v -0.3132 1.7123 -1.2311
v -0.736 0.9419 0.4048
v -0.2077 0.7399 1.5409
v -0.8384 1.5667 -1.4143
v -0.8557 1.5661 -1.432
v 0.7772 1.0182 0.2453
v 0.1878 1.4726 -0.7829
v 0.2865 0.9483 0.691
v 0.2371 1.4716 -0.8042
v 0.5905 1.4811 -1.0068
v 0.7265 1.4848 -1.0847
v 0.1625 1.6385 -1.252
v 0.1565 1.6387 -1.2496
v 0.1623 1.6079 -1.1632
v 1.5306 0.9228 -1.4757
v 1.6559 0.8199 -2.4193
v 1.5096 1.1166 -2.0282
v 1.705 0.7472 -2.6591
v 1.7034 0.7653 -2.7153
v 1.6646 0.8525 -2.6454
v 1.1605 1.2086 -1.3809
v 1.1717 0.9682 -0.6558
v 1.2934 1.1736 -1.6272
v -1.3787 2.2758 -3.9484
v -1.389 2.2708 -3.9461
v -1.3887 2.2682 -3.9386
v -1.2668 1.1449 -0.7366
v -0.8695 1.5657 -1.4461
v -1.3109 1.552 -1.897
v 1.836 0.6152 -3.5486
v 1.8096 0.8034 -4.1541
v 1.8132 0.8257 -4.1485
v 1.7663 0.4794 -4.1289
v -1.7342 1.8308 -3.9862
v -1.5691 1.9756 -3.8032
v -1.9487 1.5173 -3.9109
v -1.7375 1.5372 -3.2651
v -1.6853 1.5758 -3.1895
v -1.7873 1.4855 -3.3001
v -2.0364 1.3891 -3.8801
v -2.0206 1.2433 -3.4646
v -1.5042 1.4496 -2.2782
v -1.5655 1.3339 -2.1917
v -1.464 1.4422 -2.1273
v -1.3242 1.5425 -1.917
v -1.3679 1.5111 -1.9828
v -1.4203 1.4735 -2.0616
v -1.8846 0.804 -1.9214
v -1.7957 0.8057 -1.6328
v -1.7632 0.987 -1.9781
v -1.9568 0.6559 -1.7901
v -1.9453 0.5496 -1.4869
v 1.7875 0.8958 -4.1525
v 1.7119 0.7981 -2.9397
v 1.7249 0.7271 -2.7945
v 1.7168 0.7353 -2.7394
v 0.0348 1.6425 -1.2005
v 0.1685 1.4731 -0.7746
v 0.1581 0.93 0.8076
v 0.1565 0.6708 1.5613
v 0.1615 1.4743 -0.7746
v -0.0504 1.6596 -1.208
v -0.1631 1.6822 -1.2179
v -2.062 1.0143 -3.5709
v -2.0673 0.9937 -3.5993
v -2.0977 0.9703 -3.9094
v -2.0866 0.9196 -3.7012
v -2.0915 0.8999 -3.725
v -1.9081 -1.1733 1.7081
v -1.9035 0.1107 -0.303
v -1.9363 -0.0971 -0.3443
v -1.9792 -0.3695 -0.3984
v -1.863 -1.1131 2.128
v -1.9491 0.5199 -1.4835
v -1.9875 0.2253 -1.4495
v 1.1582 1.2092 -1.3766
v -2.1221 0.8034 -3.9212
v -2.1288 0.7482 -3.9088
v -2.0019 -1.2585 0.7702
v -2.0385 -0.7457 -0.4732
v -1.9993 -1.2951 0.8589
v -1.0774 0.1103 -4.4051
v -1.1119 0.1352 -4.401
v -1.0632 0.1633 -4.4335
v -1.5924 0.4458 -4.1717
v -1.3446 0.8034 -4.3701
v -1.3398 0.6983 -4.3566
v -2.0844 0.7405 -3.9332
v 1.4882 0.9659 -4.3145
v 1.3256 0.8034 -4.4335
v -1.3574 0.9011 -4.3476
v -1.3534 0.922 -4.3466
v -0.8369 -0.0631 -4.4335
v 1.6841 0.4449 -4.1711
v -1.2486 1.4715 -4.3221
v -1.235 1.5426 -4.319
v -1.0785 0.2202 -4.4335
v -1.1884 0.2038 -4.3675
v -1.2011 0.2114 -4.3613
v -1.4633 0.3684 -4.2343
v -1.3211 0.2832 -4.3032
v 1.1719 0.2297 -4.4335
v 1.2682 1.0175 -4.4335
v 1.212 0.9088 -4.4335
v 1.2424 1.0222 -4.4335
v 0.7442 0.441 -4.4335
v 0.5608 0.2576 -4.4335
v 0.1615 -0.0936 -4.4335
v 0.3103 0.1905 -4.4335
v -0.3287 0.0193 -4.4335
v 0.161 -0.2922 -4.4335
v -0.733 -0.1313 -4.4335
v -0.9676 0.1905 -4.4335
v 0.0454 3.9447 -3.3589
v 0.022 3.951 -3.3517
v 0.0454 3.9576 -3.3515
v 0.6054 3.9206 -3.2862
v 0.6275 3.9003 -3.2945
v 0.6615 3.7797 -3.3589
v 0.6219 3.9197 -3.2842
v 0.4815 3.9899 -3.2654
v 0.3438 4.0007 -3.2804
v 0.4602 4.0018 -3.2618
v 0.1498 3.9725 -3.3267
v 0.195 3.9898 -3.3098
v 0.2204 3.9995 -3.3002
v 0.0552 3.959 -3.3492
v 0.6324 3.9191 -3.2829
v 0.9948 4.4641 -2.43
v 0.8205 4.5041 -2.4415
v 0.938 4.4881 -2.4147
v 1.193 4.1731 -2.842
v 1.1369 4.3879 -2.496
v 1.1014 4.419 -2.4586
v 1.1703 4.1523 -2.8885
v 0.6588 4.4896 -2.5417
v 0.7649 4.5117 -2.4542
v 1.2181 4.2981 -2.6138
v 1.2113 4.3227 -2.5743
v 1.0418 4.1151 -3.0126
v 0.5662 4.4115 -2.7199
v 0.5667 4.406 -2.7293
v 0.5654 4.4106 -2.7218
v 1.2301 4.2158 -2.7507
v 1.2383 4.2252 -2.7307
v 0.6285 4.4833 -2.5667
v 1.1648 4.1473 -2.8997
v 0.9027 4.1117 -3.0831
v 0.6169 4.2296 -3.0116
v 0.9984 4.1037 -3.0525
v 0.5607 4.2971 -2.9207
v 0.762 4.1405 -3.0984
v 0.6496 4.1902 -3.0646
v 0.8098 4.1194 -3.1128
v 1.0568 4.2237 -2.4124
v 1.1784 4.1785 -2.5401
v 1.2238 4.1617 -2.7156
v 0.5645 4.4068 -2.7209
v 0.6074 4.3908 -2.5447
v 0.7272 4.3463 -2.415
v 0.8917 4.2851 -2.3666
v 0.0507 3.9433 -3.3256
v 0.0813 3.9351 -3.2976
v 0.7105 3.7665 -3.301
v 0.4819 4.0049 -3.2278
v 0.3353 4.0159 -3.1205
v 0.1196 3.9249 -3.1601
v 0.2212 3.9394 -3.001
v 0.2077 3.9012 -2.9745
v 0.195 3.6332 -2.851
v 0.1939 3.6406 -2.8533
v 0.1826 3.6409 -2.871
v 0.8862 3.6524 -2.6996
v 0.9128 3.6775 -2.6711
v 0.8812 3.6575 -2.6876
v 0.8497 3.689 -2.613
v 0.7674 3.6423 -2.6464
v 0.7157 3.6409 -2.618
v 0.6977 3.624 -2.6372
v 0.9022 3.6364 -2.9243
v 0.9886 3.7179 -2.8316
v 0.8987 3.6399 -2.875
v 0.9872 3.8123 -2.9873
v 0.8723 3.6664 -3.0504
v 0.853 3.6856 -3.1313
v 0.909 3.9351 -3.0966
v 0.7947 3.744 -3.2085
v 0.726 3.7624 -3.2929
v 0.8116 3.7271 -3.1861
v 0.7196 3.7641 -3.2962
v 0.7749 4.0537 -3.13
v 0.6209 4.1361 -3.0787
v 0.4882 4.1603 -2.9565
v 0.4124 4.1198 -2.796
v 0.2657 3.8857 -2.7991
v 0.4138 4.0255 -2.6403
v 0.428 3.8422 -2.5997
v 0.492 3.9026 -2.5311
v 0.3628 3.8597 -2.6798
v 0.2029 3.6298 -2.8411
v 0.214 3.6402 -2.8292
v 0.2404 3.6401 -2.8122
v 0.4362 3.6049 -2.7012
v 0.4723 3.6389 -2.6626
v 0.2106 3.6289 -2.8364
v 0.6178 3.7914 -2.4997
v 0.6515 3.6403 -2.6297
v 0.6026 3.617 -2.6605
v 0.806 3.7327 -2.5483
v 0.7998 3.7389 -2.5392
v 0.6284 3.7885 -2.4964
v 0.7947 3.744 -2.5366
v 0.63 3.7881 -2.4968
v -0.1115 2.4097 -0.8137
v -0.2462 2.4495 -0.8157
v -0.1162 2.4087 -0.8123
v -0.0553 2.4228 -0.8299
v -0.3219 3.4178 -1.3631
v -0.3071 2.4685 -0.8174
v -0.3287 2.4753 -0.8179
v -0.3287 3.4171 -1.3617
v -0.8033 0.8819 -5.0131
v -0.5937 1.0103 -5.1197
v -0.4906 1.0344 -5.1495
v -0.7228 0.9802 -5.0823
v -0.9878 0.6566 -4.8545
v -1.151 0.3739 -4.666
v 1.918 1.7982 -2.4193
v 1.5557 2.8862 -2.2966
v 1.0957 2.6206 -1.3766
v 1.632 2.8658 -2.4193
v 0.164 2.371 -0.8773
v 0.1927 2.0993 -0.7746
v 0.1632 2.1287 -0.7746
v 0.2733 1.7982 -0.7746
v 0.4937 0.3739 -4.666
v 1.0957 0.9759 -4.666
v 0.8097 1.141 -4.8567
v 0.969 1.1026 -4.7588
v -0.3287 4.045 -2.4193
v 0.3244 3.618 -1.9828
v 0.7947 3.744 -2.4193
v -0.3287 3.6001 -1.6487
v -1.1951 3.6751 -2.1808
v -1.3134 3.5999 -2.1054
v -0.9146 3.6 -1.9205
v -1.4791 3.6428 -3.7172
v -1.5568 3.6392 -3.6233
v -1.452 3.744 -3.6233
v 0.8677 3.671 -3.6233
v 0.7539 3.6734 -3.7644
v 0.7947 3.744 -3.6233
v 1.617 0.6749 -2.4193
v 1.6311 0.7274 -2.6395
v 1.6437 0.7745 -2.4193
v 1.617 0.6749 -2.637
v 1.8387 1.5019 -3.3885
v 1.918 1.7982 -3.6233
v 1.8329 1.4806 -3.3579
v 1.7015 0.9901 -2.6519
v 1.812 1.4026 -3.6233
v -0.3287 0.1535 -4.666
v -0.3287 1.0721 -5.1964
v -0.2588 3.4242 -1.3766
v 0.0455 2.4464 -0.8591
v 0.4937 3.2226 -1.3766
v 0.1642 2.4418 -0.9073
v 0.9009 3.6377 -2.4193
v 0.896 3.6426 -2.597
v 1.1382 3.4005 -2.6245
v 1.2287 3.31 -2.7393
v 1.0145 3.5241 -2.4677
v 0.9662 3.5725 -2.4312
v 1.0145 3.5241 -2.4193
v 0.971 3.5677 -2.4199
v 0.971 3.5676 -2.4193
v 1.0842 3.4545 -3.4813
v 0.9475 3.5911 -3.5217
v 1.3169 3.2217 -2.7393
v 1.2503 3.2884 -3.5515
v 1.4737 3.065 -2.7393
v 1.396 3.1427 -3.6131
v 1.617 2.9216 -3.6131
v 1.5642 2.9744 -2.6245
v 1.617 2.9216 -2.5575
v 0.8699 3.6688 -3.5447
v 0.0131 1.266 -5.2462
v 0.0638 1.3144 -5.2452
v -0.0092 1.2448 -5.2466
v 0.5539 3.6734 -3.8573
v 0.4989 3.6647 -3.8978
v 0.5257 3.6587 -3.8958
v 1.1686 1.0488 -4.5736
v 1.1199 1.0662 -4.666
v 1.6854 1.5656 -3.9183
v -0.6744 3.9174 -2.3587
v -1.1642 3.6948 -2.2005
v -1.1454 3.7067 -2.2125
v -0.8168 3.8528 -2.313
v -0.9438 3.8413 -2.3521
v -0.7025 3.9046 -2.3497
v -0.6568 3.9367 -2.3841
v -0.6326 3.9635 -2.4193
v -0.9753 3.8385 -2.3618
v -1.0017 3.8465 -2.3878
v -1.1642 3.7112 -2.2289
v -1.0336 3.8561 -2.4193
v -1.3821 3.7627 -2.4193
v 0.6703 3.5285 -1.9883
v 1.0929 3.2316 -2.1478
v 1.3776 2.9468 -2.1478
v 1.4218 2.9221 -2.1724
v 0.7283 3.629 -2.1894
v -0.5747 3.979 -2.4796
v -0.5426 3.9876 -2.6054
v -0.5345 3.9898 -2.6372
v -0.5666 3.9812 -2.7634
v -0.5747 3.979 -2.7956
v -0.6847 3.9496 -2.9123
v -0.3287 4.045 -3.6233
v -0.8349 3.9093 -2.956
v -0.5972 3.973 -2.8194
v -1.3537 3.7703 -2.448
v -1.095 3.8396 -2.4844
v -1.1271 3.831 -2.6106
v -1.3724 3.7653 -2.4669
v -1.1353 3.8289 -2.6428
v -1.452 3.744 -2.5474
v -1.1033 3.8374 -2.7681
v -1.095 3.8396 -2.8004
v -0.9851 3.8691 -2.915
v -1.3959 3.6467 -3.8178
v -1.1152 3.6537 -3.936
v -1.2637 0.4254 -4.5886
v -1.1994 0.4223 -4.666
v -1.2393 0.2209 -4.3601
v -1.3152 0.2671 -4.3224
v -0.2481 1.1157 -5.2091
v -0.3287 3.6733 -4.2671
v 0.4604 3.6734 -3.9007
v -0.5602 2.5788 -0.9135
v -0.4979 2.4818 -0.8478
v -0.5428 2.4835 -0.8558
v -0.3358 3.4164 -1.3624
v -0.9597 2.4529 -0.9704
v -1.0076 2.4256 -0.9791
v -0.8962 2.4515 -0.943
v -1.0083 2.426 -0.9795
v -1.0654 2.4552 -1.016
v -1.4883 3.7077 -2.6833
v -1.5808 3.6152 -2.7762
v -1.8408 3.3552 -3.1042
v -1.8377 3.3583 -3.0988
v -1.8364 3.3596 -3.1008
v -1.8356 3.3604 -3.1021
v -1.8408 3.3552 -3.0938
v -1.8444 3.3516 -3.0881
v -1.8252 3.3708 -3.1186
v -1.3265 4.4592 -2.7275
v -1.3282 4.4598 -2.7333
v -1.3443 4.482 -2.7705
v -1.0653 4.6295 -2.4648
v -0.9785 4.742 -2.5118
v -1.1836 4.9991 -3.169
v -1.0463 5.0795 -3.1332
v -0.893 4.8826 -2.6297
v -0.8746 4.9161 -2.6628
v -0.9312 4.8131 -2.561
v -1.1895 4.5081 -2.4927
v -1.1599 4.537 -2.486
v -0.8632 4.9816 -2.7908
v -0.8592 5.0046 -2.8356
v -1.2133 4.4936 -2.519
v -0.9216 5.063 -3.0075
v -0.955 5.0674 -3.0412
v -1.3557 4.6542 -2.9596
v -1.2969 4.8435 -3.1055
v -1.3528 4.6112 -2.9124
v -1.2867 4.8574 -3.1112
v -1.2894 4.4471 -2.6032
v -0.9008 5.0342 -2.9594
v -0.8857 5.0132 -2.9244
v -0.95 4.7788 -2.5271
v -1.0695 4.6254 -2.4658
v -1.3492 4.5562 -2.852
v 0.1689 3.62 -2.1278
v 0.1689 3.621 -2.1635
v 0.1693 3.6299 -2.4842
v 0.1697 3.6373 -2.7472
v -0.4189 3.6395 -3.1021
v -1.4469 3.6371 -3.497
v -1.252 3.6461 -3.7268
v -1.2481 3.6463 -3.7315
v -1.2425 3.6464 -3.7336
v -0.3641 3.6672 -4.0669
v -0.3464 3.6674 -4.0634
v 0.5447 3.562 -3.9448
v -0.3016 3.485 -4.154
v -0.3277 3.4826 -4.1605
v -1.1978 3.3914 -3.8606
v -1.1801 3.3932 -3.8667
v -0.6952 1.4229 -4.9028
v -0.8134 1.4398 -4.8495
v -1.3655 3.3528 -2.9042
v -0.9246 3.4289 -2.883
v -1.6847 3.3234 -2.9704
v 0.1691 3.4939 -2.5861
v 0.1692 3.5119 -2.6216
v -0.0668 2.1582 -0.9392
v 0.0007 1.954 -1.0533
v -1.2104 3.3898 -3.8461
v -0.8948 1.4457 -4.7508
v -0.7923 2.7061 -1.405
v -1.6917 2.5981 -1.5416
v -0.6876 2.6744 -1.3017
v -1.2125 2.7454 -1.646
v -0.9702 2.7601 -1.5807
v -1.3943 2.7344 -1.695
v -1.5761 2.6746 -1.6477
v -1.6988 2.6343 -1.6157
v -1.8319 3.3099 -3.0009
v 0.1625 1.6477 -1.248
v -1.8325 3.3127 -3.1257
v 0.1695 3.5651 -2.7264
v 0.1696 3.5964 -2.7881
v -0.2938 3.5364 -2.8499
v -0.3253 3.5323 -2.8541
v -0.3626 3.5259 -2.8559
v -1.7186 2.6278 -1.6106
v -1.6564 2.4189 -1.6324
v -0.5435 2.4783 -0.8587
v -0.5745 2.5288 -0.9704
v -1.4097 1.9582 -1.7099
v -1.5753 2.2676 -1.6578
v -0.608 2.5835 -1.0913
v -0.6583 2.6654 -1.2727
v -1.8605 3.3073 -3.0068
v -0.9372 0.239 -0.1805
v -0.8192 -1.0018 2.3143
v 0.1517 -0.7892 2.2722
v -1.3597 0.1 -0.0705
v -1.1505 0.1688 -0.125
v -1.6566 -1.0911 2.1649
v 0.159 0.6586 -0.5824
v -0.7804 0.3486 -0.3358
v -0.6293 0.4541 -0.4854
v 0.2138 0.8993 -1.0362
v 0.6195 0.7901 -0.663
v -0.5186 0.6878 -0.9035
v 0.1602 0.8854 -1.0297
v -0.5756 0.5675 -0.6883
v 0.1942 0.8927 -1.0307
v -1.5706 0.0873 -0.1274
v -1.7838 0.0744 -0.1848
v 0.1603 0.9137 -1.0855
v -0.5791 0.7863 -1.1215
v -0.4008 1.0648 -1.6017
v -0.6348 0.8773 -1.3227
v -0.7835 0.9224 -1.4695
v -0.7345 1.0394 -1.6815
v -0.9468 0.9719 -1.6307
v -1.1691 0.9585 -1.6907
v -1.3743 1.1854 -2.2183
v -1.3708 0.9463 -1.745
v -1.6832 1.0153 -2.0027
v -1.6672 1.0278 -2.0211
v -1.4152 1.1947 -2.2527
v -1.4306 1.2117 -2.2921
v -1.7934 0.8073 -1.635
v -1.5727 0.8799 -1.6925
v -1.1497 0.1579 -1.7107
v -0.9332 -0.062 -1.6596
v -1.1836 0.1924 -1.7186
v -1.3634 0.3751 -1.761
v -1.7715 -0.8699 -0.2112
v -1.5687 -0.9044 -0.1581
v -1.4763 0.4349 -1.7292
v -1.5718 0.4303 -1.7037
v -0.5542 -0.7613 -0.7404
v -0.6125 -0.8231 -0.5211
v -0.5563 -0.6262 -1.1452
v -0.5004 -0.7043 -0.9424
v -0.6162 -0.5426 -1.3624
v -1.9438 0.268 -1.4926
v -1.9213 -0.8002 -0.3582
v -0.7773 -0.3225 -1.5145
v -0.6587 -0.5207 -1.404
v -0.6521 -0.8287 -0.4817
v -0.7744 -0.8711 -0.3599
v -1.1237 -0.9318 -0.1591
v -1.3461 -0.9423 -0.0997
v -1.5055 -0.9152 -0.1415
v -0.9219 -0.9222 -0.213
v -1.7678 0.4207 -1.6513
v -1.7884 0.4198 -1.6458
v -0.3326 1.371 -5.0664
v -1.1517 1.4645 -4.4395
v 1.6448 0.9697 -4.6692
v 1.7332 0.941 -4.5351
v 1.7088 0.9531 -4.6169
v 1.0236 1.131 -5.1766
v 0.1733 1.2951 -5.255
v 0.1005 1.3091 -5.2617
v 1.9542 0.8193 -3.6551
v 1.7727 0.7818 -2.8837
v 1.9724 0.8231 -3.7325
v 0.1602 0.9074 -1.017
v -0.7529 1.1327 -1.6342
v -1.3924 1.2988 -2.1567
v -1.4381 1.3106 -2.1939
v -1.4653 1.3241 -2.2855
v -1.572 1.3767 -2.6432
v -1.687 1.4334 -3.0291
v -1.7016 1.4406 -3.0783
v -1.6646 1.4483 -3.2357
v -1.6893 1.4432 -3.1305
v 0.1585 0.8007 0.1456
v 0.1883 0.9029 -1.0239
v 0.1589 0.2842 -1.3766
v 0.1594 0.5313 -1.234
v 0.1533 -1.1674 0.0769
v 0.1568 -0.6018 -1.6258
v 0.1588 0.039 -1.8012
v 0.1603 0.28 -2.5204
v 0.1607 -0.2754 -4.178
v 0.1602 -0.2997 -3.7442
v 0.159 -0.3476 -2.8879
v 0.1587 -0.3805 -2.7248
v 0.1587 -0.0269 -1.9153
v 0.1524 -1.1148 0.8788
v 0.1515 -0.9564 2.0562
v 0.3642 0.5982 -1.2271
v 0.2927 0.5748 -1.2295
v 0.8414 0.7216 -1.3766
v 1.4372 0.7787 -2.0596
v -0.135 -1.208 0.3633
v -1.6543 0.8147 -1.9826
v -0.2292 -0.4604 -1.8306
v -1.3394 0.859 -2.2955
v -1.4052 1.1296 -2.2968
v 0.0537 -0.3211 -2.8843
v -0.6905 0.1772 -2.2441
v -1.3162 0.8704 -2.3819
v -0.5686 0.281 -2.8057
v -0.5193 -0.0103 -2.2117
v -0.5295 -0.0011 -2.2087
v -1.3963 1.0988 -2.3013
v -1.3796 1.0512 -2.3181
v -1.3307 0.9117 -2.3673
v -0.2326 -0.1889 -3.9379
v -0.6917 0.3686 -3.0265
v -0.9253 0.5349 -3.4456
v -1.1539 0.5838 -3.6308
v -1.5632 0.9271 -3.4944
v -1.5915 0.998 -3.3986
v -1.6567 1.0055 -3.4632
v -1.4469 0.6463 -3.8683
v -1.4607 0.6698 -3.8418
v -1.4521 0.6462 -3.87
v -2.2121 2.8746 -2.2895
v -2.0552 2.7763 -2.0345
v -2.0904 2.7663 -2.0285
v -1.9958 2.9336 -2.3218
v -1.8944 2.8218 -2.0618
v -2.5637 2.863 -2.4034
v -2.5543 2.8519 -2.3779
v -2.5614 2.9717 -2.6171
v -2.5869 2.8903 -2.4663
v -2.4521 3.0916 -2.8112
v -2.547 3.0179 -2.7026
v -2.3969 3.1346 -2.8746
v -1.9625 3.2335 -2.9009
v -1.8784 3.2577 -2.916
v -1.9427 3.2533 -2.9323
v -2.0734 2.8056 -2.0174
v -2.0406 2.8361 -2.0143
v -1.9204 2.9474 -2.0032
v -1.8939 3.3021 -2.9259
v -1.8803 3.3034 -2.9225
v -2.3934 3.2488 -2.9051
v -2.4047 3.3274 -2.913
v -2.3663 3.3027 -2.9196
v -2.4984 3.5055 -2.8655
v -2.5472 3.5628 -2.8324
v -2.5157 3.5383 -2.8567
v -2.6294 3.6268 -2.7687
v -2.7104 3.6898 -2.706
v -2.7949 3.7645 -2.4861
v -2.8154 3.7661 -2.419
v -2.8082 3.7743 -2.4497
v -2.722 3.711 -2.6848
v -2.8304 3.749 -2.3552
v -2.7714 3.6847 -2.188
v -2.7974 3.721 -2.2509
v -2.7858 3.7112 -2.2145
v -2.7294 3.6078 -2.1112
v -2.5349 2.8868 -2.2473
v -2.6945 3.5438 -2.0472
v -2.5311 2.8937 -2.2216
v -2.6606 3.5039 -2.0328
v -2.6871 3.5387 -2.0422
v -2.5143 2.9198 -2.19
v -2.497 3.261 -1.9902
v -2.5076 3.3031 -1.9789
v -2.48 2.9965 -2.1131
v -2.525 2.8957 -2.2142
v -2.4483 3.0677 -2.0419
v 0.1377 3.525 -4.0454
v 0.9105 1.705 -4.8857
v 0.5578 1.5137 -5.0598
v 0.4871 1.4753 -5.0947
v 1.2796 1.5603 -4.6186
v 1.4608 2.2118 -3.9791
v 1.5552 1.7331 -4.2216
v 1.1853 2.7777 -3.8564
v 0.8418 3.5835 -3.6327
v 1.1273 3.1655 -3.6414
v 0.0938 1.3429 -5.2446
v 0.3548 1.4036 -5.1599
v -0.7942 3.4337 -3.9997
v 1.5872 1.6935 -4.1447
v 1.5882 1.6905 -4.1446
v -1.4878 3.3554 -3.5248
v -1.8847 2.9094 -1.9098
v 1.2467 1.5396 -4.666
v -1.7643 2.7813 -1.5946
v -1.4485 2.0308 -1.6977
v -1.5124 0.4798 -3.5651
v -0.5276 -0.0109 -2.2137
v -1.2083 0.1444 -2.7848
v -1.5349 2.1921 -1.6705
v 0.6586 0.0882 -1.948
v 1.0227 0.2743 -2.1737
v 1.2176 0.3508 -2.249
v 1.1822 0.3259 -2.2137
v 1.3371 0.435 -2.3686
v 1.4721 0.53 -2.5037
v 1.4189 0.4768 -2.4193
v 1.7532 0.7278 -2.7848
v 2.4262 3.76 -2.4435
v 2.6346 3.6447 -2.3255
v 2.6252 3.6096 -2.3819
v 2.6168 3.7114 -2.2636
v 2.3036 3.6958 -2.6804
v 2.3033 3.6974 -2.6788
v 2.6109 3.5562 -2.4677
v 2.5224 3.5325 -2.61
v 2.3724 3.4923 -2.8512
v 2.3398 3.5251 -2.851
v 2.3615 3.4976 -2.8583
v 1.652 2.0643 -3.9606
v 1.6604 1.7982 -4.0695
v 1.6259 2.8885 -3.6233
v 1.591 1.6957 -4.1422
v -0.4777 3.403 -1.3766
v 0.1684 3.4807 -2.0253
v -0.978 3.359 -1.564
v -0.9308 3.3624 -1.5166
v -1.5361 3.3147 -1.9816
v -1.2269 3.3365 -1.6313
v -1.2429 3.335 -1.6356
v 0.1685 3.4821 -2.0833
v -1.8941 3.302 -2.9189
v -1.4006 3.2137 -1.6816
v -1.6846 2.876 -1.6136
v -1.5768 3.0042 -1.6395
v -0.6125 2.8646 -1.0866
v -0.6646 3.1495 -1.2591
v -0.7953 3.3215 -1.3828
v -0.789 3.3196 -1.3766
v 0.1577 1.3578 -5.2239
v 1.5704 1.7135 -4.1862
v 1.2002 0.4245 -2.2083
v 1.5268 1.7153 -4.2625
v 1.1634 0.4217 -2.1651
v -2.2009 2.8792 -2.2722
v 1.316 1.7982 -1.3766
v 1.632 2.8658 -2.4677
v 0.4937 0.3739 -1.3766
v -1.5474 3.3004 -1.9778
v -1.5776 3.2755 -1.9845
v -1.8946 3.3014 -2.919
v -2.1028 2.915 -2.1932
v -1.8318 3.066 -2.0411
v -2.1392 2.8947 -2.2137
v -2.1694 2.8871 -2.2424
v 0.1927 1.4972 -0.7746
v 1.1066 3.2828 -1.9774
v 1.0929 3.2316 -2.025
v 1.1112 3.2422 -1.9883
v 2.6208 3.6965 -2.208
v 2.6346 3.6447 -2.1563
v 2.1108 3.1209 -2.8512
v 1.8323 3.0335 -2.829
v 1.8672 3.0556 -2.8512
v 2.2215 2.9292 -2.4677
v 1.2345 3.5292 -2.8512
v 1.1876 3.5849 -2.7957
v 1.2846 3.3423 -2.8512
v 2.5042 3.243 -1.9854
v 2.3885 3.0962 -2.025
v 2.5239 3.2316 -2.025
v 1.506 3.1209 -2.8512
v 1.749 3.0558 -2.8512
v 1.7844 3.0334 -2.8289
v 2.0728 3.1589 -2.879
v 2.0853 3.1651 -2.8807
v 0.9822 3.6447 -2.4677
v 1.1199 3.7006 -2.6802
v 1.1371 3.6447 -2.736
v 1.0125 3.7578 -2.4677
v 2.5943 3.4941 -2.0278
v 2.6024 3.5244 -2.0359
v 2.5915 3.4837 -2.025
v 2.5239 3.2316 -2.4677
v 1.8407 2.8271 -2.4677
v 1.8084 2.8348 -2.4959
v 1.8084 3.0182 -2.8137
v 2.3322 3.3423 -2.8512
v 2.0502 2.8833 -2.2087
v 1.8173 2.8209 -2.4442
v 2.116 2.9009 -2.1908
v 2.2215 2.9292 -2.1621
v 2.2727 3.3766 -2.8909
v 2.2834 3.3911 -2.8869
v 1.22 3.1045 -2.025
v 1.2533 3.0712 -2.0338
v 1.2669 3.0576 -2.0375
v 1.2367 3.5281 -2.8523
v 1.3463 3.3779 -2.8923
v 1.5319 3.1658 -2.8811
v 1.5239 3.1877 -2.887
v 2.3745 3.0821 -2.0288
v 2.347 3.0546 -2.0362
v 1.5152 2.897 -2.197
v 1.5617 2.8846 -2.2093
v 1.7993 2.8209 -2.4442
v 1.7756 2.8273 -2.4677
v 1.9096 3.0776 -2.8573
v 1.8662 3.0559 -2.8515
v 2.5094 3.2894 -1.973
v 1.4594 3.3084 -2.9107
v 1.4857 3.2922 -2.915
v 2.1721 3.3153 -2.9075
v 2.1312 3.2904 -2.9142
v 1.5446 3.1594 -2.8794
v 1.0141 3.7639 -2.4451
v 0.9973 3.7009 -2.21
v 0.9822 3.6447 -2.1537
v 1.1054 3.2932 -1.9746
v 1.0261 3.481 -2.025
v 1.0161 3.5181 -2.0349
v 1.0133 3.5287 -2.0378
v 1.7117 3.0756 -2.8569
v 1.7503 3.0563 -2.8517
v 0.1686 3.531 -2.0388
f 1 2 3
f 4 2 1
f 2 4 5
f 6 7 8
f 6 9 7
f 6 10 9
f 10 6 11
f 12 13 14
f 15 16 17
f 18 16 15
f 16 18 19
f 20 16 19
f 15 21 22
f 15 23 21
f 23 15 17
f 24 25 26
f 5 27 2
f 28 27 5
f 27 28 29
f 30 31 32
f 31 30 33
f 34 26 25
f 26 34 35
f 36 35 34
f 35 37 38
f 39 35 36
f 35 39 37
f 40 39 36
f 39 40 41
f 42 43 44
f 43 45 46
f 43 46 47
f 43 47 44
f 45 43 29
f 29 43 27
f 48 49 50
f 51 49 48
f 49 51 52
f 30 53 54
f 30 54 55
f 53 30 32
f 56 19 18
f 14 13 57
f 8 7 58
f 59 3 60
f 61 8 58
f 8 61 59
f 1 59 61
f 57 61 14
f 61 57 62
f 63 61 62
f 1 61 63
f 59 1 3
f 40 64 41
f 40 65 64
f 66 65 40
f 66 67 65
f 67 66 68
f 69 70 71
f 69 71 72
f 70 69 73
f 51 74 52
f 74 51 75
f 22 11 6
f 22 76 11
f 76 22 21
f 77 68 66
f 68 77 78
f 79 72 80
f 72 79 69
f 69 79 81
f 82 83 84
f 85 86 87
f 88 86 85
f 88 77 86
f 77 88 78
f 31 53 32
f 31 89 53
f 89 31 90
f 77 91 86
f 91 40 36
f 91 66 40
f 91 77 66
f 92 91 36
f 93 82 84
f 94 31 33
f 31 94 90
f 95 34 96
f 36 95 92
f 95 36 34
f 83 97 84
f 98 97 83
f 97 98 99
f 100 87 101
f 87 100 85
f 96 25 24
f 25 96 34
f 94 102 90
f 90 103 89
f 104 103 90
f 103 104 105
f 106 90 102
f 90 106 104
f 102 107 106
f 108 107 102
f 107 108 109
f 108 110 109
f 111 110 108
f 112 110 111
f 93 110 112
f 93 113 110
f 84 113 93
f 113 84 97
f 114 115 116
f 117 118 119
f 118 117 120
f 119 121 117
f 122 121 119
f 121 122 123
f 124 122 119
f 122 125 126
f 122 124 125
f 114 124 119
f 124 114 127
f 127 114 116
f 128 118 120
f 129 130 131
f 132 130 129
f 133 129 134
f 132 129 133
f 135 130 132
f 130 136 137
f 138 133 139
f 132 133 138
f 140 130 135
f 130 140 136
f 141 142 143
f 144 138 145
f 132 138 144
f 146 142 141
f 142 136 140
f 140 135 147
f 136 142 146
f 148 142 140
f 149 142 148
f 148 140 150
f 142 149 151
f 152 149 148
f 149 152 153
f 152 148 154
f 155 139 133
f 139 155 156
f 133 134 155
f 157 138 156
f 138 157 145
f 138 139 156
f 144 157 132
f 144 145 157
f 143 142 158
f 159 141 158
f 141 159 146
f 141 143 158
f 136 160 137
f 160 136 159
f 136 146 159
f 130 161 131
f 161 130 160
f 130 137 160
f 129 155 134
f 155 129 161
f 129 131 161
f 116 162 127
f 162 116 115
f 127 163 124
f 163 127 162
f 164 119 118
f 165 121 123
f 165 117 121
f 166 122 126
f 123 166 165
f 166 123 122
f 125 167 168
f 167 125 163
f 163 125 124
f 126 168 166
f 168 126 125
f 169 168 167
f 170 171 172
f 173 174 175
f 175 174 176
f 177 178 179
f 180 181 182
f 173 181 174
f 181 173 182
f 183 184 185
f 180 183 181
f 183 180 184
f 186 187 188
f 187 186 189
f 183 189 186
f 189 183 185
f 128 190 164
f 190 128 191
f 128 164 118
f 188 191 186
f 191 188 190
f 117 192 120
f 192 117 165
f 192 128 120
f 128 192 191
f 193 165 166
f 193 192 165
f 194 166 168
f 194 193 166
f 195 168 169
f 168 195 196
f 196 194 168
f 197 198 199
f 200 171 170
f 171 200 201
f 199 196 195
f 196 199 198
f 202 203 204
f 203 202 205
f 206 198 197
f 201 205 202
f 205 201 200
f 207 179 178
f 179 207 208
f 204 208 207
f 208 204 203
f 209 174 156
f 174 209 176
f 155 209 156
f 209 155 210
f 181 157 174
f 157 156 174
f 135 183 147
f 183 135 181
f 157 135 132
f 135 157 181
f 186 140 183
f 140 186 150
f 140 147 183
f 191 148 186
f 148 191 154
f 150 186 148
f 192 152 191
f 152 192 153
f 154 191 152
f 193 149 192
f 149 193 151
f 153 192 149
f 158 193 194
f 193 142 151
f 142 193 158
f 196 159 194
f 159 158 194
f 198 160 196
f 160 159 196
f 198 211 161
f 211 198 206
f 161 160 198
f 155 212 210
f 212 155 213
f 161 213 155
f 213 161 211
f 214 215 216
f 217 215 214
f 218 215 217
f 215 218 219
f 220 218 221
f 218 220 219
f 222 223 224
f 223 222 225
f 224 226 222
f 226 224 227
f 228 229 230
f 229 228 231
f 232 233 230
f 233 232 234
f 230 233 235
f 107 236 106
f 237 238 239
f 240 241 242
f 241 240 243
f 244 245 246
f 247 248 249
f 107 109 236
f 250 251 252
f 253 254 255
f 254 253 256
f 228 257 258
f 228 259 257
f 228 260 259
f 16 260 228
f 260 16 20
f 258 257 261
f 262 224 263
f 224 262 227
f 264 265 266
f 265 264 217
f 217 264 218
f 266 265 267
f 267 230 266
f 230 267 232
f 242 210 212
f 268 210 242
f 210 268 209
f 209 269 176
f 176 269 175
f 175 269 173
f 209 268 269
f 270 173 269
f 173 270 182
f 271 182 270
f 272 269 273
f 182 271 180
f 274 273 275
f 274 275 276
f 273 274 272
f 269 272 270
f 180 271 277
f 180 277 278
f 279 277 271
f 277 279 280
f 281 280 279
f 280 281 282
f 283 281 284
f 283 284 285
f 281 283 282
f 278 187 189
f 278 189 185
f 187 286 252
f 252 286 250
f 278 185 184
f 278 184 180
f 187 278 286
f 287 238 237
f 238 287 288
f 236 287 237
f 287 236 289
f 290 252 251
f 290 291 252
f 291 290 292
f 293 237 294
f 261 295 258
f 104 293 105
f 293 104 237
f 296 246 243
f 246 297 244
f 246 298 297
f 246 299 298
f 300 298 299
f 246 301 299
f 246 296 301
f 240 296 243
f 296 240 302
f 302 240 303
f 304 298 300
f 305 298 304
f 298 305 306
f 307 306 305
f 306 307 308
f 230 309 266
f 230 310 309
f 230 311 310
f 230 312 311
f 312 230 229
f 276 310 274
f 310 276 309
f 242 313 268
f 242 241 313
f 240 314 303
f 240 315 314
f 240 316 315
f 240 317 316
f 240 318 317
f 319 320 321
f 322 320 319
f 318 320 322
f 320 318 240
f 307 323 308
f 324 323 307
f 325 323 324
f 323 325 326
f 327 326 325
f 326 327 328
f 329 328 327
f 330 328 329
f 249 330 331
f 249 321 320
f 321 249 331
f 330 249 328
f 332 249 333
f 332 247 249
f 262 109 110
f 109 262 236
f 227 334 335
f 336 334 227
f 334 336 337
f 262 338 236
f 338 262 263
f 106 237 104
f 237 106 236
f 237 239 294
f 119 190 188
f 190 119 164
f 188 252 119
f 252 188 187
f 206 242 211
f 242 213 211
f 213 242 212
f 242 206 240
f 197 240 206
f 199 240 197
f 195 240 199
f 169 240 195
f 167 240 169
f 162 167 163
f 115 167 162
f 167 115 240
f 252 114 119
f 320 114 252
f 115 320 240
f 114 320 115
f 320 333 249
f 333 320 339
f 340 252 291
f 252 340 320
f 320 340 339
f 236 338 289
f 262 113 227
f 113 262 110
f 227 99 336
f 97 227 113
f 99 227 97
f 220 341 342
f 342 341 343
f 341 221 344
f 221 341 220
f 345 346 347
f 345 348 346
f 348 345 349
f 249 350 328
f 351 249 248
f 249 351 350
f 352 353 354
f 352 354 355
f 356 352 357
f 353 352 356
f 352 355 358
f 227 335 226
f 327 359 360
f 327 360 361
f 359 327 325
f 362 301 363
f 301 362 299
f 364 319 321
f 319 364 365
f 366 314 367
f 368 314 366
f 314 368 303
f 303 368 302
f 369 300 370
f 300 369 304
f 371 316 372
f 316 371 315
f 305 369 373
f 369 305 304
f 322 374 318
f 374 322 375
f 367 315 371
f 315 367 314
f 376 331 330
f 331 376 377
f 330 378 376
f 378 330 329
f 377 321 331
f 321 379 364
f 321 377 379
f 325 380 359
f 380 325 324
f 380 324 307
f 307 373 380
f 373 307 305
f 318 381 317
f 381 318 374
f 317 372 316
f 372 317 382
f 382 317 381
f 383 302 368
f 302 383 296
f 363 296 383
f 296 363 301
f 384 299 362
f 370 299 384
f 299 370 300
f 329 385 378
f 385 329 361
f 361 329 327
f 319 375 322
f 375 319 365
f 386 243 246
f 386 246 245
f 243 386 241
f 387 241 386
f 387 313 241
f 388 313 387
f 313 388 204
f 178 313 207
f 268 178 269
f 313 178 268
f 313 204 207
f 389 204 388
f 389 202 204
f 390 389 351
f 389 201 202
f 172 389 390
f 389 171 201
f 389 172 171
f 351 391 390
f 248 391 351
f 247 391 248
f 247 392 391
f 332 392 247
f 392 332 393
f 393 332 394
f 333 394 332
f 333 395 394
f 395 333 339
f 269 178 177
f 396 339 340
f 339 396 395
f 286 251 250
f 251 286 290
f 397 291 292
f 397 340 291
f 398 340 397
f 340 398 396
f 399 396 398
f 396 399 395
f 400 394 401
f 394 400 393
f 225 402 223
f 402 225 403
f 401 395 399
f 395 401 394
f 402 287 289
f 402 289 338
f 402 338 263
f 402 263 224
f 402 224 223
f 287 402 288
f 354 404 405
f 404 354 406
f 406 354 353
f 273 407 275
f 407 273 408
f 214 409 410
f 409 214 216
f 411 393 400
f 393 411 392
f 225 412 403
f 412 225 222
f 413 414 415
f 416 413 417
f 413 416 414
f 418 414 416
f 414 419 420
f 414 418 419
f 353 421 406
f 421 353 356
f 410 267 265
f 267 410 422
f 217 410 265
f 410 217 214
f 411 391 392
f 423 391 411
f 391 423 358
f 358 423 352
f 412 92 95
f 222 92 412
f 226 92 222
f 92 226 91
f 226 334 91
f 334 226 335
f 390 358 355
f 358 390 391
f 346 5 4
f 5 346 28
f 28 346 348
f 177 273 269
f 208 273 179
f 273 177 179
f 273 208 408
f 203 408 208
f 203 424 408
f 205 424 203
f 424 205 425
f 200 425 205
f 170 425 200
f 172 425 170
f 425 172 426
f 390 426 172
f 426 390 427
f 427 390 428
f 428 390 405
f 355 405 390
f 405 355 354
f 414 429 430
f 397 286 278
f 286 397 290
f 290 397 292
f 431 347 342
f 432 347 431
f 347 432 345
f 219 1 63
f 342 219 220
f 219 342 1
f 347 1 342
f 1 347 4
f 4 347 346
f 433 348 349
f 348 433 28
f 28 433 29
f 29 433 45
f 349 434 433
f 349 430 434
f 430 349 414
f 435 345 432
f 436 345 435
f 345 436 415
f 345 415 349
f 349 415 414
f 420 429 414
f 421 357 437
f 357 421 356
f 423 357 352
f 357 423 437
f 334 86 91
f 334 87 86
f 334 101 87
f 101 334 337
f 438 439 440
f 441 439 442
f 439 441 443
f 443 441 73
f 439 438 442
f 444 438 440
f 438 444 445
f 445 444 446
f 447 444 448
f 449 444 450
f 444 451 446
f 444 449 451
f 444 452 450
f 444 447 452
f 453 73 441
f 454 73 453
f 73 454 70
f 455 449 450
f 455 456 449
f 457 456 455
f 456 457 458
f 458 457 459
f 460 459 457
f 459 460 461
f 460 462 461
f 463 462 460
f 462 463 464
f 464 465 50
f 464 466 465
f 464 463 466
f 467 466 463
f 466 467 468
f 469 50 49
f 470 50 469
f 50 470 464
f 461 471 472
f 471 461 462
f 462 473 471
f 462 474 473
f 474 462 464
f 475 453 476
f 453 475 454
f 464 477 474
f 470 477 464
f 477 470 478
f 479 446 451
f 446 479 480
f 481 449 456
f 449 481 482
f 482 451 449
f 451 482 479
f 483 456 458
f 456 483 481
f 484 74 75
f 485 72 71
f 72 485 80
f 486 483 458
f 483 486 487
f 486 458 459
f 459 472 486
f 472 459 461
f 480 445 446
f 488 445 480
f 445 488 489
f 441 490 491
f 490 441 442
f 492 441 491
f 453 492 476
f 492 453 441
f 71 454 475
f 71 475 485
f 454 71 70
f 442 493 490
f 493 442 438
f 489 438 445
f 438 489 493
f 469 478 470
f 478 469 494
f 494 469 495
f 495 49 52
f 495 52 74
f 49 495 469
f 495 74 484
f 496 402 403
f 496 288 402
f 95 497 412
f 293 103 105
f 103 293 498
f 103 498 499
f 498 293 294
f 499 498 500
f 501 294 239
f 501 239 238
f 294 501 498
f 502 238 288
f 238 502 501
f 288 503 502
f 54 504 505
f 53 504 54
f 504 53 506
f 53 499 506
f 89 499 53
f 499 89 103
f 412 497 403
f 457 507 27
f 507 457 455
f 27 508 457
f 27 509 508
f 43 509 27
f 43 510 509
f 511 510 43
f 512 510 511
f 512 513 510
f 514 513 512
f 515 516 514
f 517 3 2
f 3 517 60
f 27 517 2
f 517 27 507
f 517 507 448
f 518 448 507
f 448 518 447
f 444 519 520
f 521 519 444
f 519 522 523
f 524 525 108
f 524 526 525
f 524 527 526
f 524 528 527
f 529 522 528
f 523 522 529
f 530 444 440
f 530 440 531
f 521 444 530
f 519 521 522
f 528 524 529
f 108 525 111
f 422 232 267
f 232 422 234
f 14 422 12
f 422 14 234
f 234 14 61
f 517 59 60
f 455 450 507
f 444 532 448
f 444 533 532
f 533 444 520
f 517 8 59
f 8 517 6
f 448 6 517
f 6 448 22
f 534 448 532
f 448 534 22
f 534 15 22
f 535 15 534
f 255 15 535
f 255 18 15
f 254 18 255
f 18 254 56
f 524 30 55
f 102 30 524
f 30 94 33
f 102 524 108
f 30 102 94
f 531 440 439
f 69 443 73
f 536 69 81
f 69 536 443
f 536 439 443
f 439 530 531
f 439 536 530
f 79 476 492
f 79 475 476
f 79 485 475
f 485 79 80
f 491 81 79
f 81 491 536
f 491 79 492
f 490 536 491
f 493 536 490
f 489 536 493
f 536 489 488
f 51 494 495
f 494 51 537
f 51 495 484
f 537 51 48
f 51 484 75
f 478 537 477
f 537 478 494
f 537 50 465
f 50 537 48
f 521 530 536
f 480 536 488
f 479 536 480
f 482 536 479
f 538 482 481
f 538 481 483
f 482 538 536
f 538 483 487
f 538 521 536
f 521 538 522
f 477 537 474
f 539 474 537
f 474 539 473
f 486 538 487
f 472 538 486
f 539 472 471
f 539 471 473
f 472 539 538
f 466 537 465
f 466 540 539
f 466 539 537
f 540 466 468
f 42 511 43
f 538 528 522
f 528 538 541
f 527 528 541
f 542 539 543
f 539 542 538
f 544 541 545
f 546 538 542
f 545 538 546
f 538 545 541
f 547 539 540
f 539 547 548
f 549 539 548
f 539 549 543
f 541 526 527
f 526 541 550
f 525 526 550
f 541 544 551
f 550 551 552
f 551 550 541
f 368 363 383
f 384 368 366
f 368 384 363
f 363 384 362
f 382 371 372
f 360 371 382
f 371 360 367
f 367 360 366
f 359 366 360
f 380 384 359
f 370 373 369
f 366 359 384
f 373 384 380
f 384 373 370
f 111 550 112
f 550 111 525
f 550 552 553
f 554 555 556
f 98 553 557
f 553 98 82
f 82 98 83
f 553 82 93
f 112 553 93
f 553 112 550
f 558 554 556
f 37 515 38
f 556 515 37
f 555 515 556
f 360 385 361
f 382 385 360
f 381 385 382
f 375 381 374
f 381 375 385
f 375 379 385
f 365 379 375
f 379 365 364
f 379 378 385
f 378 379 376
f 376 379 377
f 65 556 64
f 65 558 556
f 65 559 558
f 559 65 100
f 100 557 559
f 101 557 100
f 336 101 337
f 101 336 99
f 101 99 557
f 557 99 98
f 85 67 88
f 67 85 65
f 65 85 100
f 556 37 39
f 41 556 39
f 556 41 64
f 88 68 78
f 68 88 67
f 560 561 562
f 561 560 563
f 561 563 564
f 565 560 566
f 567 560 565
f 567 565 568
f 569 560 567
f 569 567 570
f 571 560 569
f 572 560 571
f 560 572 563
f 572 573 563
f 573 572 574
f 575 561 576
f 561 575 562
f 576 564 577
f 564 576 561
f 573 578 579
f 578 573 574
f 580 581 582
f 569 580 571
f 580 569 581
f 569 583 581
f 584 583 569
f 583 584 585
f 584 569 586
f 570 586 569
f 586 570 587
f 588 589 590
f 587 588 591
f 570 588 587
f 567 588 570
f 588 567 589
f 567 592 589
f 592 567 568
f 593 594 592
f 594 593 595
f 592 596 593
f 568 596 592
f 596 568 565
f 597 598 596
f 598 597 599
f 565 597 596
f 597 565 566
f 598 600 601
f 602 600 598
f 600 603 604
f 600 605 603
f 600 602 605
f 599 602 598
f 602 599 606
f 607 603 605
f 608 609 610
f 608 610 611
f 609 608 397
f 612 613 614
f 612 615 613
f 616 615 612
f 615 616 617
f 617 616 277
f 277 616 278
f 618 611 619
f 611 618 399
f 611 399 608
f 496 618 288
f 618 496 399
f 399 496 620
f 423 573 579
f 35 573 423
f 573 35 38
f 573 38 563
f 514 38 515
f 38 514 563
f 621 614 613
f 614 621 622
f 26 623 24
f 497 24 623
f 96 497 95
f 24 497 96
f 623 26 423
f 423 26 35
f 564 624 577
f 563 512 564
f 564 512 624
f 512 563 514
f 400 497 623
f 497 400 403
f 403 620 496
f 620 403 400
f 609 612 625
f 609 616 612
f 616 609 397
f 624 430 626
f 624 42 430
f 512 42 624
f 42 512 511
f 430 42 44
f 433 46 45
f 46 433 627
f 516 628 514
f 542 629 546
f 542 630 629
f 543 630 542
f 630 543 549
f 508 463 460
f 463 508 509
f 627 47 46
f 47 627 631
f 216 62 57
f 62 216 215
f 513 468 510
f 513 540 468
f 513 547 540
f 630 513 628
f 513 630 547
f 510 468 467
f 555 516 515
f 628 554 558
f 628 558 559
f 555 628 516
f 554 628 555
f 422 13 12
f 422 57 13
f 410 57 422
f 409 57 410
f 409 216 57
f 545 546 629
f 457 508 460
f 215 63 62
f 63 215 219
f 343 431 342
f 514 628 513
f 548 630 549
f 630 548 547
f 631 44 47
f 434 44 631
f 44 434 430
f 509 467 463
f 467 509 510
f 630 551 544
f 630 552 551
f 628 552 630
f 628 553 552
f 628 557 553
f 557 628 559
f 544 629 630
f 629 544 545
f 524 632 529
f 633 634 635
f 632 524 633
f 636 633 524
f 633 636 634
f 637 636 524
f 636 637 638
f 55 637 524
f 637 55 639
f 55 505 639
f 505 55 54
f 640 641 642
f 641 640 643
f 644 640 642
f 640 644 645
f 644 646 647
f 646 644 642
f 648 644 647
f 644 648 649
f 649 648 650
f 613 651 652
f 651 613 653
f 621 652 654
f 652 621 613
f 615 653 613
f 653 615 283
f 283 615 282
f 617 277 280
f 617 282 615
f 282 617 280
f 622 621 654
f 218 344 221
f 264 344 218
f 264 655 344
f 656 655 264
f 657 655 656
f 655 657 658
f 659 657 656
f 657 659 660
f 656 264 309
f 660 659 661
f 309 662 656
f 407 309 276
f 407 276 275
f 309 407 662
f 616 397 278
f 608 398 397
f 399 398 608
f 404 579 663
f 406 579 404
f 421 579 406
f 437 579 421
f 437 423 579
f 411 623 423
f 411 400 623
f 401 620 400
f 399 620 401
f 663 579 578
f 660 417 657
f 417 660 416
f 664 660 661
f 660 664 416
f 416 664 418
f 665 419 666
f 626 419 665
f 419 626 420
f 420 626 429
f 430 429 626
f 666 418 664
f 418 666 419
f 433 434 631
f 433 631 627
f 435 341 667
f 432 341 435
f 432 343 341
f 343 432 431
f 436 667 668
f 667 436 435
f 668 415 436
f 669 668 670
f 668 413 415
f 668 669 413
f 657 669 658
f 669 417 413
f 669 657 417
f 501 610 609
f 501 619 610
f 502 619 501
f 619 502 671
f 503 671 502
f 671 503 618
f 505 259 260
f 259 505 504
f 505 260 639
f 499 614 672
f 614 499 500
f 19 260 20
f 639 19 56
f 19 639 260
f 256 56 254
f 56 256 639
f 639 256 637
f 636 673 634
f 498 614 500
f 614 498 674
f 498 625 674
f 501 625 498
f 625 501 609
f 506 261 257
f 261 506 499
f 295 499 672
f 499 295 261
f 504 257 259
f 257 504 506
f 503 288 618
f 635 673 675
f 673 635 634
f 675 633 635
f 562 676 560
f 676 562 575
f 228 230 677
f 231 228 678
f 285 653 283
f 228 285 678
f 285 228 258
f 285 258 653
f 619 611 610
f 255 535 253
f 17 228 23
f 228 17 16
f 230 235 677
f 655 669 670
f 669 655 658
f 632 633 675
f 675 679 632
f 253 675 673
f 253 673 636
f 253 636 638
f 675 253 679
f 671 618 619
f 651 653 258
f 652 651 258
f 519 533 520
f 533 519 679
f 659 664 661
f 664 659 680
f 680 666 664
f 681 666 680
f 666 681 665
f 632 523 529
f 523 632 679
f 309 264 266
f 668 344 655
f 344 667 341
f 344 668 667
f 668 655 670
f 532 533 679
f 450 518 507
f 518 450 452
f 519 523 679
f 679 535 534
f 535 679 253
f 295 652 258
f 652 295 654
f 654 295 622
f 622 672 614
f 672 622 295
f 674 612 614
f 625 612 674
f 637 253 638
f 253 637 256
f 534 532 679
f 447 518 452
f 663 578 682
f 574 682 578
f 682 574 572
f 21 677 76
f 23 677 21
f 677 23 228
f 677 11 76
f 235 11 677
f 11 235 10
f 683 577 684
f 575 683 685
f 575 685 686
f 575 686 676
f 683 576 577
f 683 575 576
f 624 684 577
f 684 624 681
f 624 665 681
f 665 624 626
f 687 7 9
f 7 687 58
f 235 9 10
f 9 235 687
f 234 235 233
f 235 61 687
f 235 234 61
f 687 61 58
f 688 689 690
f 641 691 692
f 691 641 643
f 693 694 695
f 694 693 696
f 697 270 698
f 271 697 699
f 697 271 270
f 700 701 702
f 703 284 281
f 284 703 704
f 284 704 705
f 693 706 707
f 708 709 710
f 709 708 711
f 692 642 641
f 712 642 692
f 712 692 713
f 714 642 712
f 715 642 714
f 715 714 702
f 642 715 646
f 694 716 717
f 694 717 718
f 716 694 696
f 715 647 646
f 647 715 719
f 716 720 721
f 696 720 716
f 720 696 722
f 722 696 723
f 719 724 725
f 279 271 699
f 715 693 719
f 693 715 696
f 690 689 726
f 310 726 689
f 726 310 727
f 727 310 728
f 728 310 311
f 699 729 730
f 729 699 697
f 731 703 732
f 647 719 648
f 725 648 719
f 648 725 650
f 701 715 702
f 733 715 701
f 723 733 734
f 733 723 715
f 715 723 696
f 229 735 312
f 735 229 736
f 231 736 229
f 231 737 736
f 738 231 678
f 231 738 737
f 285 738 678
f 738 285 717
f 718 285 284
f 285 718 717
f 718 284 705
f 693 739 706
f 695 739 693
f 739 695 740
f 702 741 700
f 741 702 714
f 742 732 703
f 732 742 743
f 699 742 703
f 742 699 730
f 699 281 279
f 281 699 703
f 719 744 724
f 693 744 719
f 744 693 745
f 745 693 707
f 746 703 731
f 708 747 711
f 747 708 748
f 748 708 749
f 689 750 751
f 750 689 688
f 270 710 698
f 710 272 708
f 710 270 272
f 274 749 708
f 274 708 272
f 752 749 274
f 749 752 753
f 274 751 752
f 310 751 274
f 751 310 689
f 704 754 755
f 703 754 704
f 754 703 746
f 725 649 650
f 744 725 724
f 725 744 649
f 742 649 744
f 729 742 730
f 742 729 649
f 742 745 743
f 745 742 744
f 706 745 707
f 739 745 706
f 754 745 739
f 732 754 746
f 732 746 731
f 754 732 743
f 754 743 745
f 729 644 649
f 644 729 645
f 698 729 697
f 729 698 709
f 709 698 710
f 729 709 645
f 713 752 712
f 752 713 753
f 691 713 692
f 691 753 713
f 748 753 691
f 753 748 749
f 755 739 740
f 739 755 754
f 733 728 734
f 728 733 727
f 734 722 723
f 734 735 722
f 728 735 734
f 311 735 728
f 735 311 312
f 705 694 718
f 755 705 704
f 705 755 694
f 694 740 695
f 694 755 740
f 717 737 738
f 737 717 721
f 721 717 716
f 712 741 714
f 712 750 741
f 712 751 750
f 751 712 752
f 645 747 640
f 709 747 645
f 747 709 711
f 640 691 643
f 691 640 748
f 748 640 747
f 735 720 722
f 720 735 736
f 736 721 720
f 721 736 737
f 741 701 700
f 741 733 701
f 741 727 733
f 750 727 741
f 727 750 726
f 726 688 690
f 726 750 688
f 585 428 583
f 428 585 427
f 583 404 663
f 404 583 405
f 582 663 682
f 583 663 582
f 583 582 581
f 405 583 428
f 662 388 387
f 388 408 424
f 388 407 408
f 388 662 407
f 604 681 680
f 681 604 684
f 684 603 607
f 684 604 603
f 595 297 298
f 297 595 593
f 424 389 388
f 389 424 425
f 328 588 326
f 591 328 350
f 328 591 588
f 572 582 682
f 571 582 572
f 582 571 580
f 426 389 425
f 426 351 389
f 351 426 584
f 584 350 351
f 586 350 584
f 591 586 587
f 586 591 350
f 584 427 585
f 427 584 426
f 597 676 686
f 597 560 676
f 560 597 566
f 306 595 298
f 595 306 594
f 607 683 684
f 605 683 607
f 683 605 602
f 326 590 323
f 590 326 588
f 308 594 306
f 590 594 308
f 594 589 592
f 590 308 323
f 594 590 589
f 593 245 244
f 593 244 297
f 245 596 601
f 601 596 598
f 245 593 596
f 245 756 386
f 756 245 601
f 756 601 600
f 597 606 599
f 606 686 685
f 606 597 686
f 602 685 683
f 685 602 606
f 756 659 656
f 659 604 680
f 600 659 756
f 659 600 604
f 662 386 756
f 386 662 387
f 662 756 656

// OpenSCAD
intersection() {
translate([-3.293904, -5.904024, -6.000000])
cube(size = [6.587808, 11.808048, 12.000000], center = false);
union() {
// Begin.
union() {
intersection() {
union() {
union() {
intersection() {
rotate([0, -70.564, -83.8064])
translate([0, -0.126678, -0.790822])
rotate([0, 90, 0])
cylinder(h = 38, r1 = 2.01835, r2 = 2.01835, center = true, $fn = 12);

translate([0.04541, 0.80336, 0.34418])
sphere(r = 4.9462, $fn = 12);
}

intersection() {
translate([0.04541, 0.80336, 0.34418])
sphere(r = 4.9462, $fn = 12);

translate([0.51496, 4.42519, -3.43138])
rotate([0, 29.5662, -20.3935])
rotate([0, 90, 0])
rotate_extrude($fn = 12)
translate([0.81987, 0, 0])
circle(r = 0.3517, $fn = 12);
}
}

intersection() {
union() {
translate([-0.32868, 1.79825, -3.02131])
sphere(r = 2.32598, $fn = 12);

rotate([0, -10.5486, -72.2556])
translate([-9.8378, 0.396296, -1.86718])
rotate([0, 90, 0])
cylinder(h = 18.3244, r1 = 0.31062, r2 = 0.31062, center = true, $fn = 12);
}

union() {
rotate([-178.398, 0, 0.750918])
translate([0, -11.2783, 0])
cube(size = [38, 15.4435, 38], center = true);

rotate([0, 26.4329, -78.8553])
translate([8.55542, 0.351596, -3.53207])
rotate([0, 90, 0])
cylinder(h = 20.8892, r1 = 1.74269, r2 = 1.74269, center = true, $fn = 12);
}
}
}

difference() {
union() {
rotate([5.17169, -0, -10.4524])
translate([0, 9.91302, 0])
cube(size = [38, 18.174, 38], center = true);

difference() {
rotate([-153.567, 0, 11.1447])
translate([0, 9.35408, 0])
cube(size = [38, 19.2918, 38], center = true);

rotate([0, 1.60165, -89.2491])
translate([0, -1.35832, -0.92254])
rotate([0, 90, 0])
cylinder(h = 38, r1 = 0.84876, r2 = 0.84876, center = true, $fn = 12);
}
}

union() {
difference() {
rotate([-0, -0.068182, -0.155845])
translate([9.57827, 0, 0])
cube(size = [18.8435, 38, 38], center = true);

rotate([169.451, 0, 17.7444])
translate([0, -9.8378, 0])
cube(size = [38, 18.3244, 38], center = true);
}

difference() {
rotate([-178.398, 0, 0.750918])
translate([0, 0, 0])
cube(size = [38, 38, 38], center = true);

translate([-2.10784, 2.61544, -2.50246])
rotate([0, 7.34194, -89.2836])
rotate([0, 90, 0])
rotate_extrude($fn = 12)
translate([3.84969, 0, 0])
circle(r = 3.45, $fn = 12);
}
}
}
}

intersection() {
union() {
union() {
difference() {
rotate([-153.567, 0, 11.1447])
translate([0, -10.4446, 0])
cube(size = [38, 17.1108, 38], center = true);

translate([-2.10784, 2.61544, -2.50246])
rotate([0, 7.34194, -89.2836])
rotate([0, 90, 0])
rotate_extrude($fn = 12)
translate([3.84969, 0, 0])
circle(r = 3.45, $fn = 12);
}

intersection() {
rotate([0, 26.4329, -78.8553])
translate([0, 0.351596, -3.53207])
rotate([0, 90, 0])
cylinder(h = 38, r1 = 1.74269, r2 = 1.74269, center = true, $fn = 12);

rotate([5.17169, -0, -10.4524])
translate([0, 9.91302, 0])
cube(size = [38, 18.174, 38], center = true);
}
}

intersection() {
union() {
rotate([0, 26.4329, -78.8553])
translate([-9.04817, 0.351596, -3.53207])
rotate([0, 90, 0])
cylinder(h = 19.9037, r1 = 1.74269, r2 = 1.74269, center = true, $fn = 12);

rotate([-0, -0.068182, -0.155845])
translate([9.57827, 0, 0])
cube(size = [18.8435, 38, 38], center = true);
}

intersection() {
rotate([-153.567, 0, 11.1447])
translate([0, -9.04817, 0])
cube(size = [38, 19.9037, 38], center = true);

translate([0.04541, 0.80336, 0.34418])
sphere(r = 4.9462, $fn = 12);
}
}
}

union() {
intersection() {
difference() {
rotate([-178.668, 0, 5.52939])
translate([0, 7.79984, 0])
cube(size = [38, 22.4003, 38], center = true);

rotate([0, 1.60165, -89.2491])
translate([0, -1.35832, -0.92254])
rotate([0, 90, 0])
cylinder(h = 38, r1 = 0.84876, r2 = 0.84876, center = true, $fn = 12);
}

union() {
rotate([0, 26.4329, -78.8553])
translate([9.35408, 0.351596, -3.53207])
rotate([0, 90, 0])
cylinder(h = 19.2918, r1 = 1.74269, r2 = 1.74269, center = true, $fn = 12);

translate([-0.32868, 1.79825, -3.02131])
sphere(r = 2.32598, $fn = 12);
}
}

union() {
intersection() {
translate([1.80842, 3.6447, -2.24635])
sphere(r = 0.85536, $fn = 12);

rotate([0, -0.068182, -0.155845])
translate([9.57827, 3.29622, -2.44634])
rotate([0, 90, 0])
cylinder(h = 18.8435, r1 = 0.47041, r2 = 0.47041, center = true, $fn = 12);
}

rotate([0, -0.068182, -0.155845])
translate([-9.42173, 3.29622, -2.44634])
rotate([0, 90, 0])
cylinder(h = 19.1565, r1 = 0.47041, r2 = 0.47041, center = true, $fn = 12);
}
}
}
}
// End.
}
}
